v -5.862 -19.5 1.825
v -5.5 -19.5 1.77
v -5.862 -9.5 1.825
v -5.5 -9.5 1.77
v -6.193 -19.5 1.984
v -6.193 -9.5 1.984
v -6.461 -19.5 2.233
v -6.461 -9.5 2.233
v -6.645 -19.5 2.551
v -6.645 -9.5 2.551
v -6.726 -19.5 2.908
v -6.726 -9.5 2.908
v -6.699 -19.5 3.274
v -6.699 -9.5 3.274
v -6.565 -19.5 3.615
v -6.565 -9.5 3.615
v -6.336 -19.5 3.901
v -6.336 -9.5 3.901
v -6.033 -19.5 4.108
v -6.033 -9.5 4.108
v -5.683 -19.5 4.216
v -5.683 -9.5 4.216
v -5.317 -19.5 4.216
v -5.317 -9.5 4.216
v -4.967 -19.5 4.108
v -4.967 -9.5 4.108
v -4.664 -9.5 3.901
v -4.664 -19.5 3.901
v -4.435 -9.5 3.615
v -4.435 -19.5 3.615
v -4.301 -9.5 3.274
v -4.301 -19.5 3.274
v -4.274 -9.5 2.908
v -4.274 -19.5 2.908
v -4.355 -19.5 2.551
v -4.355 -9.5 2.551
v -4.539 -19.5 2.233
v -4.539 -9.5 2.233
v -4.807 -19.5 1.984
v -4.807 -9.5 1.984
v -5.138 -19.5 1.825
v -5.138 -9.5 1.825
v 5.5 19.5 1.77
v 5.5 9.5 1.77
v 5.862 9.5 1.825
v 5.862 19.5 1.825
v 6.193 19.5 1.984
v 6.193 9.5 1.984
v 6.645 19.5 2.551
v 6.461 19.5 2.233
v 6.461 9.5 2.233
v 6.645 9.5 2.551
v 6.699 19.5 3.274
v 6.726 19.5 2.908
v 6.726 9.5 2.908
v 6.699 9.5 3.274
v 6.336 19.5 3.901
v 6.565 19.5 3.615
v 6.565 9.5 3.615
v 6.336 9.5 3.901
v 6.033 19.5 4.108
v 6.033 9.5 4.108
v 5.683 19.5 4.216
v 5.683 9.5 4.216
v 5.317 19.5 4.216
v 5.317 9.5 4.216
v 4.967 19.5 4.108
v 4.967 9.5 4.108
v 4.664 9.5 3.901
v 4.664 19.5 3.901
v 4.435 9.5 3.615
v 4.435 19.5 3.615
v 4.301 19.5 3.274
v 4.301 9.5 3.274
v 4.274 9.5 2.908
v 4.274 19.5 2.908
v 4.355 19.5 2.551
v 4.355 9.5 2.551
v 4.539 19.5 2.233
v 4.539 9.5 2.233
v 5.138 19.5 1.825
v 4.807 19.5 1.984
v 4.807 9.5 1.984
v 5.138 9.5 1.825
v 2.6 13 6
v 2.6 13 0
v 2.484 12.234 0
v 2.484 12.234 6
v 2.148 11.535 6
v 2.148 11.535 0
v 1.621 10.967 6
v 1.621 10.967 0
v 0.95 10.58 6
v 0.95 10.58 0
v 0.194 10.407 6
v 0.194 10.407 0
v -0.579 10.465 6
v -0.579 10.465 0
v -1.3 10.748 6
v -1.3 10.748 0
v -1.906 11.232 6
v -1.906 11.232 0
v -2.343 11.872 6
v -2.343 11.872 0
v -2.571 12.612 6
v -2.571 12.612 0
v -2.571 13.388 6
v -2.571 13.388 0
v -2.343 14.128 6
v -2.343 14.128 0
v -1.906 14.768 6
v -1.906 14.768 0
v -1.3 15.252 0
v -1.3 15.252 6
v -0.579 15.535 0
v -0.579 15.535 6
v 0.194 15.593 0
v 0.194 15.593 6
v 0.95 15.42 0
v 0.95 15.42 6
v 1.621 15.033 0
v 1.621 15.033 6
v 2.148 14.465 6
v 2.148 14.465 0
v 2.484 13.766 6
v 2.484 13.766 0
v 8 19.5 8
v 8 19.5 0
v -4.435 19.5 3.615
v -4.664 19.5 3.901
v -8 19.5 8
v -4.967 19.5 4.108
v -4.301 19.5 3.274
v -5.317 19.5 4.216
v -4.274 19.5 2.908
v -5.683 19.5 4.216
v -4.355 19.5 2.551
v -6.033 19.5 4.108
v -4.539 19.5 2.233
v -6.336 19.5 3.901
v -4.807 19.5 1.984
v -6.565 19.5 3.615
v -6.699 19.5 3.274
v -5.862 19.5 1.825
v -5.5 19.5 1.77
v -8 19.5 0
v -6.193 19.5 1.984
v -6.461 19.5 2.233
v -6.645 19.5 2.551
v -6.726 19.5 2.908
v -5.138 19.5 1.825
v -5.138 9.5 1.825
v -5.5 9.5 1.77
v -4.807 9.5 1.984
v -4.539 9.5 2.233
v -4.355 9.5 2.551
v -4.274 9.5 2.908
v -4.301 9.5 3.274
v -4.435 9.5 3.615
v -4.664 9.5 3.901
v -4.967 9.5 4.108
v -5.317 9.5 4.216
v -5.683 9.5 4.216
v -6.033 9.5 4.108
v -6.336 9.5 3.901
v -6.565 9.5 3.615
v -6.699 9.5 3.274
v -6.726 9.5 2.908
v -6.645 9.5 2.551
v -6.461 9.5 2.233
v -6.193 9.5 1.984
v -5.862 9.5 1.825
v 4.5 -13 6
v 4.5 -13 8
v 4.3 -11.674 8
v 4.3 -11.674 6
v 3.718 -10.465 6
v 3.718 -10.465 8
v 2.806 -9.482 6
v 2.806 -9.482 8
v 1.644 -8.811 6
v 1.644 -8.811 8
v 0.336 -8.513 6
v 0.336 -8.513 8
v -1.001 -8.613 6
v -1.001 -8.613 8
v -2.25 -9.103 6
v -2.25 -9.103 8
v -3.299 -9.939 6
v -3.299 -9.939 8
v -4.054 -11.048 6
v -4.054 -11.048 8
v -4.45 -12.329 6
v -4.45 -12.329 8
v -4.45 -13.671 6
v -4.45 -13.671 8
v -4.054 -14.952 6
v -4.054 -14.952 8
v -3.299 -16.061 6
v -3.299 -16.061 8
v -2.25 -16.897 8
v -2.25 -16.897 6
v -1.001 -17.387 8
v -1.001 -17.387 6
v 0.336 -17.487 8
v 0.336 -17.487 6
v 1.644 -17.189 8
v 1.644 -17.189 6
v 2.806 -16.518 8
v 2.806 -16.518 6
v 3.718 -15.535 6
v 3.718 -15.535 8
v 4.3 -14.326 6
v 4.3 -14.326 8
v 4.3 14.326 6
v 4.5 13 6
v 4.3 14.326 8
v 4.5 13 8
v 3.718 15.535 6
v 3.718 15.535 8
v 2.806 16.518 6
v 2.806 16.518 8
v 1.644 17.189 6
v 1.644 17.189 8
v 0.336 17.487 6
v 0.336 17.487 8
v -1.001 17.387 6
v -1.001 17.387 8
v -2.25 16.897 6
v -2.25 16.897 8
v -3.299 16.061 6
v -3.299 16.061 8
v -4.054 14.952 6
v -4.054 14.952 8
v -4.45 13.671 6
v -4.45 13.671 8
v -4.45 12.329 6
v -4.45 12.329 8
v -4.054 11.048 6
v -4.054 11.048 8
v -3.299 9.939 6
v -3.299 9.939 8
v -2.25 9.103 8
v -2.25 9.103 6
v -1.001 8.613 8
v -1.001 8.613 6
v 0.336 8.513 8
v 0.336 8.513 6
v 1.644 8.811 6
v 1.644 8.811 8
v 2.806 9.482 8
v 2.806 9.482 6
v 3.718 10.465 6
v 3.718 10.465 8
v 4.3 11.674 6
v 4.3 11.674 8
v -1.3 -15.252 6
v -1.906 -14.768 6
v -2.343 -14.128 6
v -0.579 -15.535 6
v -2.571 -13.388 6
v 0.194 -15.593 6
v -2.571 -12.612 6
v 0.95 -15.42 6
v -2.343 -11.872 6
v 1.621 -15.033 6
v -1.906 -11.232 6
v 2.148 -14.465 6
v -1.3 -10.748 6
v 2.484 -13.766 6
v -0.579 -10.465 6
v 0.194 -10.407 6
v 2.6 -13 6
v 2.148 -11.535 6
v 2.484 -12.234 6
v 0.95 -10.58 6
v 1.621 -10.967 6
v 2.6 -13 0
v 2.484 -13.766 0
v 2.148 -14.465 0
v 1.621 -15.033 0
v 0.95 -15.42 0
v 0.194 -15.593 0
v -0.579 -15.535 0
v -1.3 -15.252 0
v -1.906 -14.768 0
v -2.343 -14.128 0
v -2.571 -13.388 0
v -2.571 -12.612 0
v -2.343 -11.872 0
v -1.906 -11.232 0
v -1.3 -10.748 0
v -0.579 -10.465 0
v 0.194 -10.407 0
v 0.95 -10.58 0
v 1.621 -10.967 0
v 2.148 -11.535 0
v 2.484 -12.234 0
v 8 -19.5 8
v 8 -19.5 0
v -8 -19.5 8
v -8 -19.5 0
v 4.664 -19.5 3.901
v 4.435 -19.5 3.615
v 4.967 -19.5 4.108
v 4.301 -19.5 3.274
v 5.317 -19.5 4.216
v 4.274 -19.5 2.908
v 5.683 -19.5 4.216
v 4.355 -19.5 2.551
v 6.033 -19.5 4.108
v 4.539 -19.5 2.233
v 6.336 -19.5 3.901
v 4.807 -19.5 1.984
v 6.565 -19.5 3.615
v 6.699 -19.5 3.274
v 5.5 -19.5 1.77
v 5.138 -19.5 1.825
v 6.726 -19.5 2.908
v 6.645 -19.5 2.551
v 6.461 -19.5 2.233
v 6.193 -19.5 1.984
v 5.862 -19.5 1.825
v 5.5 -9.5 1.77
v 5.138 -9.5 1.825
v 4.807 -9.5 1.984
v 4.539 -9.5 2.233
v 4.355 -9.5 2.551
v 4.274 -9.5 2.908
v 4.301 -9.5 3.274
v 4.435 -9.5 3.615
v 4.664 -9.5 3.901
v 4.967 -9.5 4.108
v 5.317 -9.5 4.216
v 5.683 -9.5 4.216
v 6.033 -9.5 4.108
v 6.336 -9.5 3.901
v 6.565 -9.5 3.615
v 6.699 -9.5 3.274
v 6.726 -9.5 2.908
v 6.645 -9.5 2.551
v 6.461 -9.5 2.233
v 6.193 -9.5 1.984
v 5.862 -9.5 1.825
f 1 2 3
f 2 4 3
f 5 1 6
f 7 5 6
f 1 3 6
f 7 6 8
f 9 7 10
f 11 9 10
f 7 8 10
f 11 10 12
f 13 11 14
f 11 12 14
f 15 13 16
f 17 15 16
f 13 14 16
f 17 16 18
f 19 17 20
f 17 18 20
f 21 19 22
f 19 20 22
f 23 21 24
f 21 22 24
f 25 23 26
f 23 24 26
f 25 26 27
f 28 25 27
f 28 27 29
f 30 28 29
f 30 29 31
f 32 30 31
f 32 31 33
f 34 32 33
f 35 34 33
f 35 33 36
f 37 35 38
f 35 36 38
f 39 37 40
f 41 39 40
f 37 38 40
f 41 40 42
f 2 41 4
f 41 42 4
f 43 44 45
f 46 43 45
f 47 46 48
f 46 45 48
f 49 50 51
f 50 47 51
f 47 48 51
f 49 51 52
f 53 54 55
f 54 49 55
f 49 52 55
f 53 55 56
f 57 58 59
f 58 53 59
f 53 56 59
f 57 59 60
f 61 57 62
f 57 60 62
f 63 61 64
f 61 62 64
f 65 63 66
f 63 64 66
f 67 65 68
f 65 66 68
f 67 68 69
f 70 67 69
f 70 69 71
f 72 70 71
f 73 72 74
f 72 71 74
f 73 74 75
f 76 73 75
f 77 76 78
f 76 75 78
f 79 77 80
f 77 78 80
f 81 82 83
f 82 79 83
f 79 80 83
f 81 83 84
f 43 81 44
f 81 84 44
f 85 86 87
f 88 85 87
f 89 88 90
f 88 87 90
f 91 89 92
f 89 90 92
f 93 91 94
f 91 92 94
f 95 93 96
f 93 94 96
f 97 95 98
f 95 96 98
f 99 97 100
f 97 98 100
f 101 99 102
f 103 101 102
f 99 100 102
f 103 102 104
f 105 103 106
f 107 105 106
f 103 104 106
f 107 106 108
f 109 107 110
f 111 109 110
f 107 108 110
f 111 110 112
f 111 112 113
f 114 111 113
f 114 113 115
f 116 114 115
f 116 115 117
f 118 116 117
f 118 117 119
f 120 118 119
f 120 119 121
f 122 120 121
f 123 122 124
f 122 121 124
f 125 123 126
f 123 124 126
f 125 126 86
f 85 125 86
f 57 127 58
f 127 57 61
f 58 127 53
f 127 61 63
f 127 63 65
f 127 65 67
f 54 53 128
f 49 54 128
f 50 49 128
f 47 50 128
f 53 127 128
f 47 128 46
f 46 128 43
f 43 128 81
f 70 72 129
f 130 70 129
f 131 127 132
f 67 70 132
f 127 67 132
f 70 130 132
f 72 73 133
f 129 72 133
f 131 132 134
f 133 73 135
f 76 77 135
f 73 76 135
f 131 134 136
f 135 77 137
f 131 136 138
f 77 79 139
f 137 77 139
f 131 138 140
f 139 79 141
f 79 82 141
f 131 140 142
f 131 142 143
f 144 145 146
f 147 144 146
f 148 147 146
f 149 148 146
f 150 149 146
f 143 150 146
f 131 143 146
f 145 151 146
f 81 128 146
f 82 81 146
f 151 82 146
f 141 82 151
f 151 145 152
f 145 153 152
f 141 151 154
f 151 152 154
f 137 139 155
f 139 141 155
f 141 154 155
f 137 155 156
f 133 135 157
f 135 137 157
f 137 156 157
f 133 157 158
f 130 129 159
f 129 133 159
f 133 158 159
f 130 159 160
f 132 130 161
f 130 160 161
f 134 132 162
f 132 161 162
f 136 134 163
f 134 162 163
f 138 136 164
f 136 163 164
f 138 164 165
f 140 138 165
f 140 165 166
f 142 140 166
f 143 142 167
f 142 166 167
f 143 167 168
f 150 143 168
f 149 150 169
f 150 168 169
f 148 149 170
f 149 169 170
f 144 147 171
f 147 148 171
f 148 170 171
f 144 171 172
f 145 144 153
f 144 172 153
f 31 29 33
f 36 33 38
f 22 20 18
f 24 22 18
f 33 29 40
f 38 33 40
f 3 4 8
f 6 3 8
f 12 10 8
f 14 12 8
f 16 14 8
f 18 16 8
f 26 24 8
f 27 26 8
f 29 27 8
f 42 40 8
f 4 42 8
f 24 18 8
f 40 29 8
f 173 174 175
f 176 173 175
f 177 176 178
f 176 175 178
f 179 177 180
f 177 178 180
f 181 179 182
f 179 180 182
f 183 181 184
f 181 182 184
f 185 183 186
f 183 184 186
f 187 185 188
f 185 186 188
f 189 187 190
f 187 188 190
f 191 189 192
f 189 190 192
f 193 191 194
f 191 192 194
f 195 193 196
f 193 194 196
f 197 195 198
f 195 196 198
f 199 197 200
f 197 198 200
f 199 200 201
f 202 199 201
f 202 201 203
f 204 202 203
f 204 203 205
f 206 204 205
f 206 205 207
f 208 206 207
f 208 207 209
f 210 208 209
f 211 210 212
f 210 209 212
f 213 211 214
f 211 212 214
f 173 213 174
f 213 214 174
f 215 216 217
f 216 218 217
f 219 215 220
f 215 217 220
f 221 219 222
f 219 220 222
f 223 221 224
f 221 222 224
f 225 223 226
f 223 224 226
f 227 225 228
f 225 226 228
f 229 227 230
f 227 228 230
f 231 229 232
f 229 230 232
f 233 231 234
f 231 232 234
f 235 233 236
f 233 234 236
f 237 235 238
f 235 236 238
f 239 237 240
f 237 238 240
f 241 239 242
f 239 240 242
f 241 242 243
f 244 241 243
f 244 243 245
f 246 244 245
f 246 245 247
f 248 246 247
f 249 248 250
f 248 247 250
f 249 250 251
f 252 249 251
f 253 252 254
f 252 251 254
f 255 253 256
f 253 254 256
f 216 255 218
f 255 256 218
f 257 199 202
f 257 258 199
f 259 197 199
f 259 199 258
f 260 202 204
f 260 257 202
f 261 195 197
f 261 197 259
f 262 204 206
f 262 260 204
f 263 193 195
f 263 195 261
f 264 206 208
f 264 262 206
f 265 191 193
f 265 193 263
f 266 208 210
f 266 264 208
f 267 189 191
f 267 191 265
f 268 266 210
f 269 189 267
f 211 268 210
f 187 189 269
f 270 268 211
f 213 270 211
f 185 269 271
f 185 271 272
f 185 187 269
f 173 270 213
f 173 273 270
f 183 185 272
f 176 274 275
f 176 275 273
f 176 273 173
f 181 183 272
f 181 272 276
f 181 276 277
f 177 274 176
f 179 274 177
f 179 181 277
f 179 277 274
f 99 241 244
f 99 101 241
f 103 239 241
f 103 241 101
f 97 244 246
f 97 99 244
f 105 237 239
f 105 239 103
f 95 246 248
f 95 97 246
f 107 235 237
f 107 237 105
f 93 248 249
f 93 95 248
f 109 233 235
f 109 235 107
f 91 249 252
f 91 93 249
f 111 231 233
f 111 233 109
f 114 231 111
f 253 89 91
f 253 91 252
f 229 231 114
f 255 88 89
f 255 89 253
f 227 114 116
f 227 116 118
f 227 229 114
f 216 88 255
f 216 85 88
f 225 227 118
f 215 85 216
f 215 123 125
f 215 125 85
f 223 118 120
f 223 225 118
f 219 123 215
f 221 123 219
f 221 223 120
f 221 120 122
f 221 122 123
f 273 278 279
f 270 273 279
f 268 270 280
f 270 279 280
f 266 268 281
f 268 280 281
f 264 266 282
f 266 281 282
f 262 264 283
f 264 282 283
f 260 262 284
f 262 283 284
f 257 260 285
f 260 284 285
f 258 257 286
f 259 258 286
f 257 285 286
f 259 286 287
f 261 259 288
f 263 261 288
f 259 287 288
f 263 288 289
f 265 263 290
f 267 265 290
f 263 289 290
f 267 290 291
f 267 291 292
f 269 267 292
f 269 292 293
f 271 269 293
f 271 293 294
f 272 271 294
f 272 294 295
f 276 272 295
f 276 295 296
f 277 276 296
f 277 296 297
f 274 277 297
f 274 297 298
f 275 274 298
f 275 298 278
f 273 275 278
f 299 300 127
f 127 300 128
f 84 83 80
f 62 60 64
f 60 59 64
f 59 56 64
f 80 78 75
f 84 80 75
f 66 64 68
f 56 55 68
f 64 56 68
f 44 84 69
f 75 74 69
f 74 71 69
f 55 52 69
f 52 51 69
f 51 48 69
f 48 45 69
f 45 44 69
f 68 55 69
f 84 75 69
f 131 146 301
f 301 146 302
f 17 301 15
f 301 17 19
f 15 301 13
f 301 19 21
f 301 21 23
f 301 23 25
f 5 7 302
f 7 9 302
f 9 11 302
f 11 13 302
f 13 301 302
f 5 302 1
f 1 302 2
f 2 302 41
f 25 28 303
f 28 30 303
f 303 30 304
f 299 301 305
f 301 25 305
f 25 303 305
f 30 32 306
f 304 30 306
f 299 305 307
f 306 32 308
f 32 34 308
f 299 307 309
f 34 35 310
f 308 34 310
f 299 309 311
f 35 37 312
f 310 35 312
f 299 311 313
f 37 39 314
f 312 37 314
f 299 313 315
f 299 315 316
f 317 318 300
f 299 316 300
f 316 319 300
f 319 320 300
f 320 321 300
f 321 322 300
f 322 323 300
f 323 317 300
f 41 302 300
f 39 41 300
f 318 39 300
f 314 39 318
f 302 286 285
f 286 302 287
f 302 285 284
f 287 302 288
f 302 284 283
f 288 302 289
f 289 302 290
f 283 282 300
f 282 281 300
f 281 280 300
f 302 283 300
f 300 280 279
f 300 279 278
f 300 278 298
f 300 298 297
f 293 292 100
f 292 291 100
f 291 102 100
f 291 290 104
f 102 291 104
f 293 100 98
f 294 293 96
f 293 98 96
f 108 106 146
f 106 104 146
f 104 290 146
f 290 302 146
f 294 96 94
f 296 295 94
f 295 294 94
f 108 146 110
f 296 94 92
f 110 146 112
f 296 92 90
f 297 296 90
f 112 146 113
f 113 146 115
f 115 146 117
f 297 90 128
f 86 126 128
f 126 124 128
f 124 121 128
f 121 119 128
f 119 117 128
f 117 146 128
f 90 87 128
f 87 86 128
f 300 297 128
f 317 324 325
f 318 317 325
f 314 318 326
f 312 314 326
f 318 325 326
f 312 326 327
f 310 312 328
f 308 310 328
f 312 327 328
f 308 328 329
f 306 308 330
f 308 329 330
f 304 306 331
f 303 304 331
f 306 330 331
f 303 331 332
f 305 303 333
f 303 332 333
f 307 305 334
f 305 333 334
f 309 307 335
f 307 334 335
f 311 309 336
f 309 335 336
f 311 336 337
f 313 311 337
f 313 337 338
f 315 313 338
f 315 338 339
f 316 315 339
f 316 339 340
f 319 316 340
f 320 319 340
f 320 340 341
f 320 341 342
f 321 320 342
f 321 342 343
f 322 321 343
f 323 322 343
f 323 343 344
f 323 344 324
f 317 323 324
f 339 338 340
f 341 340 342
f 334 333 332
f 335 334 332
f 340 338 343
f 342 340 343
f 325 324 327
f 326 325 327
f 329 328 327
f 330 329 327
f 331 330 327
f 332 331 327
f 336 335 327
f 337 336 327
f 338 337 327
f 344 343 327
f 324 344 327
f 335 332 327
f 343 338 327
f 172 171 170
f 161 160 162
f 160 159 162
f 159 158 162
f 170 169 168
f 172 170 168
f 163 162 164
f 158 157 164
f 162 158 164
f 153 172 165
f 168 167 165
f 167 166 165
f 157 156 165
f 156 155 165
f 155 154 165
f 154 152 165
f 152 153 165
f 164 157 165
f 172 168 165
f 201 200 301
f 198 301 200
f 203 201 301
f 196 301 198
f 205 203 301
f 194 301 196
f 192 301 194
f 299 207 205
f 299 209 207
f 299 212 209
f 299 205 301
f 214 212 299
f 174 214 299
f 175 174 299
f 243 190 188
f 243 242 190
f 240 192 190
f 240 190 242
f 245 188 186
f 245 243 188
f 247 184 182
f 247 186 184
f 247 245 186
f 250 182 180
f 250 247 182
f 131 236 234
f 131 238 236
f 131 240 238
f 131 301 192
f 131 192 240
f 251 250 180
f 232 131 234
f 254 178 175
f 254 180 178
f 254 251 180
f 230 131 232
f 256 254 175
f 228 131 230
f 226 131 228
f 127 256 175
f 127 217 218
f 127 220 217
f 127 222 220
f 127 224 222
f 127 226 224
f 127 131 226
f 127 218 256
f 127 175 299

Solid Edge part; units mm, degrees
sketch "Sketch1" plane through (0, 0, 0) normal (0, 0, 1) x (1, 0, 0)
  line L0 (-8, -19.5) -> (8, -19.5)
  line L1 (8, -19.5) -> (8, 19.5)
  line L2 (8, 19.5) -> (-8, 19.5)
  line L3 (-8, 19.5) -> (-8, -19.5)
  circle A0 centre (0, 13) radius 2.6
  circle A1 centre (0, -13) radius 2.6
  dimension "D1" = 13
  dimension "D2" = 13
extrude "Protrusion1" add sketch "Sketch1" along normal blind 8
sketch "Sketch2" plane through (0, 0, 8) normal (0, 0, 1) x (1, 0, 0)
  circle A0 centre (0, 13) radius 4.5
  circle A1 centre (0, -13) radius 4.5
extrude "ExtrudedCutout_1" cut sketch "Sketch2" against normal blind 2
hole "Hole_1" at (-5.5, -19.5, 3) direction (0, 1, 0) diameter 2.459 depth 10 thread major 3 thread length 8
hole "Hole1" at (5.5, -19.5, 3) direction (0, 1, 0) diameter 2.459 depth 10 thread major 3 thread length 8
mirror "Mirror1" about plane through (0, 0, 0) normal (0, 1, 0) of "Hole_1", "Hole1"
